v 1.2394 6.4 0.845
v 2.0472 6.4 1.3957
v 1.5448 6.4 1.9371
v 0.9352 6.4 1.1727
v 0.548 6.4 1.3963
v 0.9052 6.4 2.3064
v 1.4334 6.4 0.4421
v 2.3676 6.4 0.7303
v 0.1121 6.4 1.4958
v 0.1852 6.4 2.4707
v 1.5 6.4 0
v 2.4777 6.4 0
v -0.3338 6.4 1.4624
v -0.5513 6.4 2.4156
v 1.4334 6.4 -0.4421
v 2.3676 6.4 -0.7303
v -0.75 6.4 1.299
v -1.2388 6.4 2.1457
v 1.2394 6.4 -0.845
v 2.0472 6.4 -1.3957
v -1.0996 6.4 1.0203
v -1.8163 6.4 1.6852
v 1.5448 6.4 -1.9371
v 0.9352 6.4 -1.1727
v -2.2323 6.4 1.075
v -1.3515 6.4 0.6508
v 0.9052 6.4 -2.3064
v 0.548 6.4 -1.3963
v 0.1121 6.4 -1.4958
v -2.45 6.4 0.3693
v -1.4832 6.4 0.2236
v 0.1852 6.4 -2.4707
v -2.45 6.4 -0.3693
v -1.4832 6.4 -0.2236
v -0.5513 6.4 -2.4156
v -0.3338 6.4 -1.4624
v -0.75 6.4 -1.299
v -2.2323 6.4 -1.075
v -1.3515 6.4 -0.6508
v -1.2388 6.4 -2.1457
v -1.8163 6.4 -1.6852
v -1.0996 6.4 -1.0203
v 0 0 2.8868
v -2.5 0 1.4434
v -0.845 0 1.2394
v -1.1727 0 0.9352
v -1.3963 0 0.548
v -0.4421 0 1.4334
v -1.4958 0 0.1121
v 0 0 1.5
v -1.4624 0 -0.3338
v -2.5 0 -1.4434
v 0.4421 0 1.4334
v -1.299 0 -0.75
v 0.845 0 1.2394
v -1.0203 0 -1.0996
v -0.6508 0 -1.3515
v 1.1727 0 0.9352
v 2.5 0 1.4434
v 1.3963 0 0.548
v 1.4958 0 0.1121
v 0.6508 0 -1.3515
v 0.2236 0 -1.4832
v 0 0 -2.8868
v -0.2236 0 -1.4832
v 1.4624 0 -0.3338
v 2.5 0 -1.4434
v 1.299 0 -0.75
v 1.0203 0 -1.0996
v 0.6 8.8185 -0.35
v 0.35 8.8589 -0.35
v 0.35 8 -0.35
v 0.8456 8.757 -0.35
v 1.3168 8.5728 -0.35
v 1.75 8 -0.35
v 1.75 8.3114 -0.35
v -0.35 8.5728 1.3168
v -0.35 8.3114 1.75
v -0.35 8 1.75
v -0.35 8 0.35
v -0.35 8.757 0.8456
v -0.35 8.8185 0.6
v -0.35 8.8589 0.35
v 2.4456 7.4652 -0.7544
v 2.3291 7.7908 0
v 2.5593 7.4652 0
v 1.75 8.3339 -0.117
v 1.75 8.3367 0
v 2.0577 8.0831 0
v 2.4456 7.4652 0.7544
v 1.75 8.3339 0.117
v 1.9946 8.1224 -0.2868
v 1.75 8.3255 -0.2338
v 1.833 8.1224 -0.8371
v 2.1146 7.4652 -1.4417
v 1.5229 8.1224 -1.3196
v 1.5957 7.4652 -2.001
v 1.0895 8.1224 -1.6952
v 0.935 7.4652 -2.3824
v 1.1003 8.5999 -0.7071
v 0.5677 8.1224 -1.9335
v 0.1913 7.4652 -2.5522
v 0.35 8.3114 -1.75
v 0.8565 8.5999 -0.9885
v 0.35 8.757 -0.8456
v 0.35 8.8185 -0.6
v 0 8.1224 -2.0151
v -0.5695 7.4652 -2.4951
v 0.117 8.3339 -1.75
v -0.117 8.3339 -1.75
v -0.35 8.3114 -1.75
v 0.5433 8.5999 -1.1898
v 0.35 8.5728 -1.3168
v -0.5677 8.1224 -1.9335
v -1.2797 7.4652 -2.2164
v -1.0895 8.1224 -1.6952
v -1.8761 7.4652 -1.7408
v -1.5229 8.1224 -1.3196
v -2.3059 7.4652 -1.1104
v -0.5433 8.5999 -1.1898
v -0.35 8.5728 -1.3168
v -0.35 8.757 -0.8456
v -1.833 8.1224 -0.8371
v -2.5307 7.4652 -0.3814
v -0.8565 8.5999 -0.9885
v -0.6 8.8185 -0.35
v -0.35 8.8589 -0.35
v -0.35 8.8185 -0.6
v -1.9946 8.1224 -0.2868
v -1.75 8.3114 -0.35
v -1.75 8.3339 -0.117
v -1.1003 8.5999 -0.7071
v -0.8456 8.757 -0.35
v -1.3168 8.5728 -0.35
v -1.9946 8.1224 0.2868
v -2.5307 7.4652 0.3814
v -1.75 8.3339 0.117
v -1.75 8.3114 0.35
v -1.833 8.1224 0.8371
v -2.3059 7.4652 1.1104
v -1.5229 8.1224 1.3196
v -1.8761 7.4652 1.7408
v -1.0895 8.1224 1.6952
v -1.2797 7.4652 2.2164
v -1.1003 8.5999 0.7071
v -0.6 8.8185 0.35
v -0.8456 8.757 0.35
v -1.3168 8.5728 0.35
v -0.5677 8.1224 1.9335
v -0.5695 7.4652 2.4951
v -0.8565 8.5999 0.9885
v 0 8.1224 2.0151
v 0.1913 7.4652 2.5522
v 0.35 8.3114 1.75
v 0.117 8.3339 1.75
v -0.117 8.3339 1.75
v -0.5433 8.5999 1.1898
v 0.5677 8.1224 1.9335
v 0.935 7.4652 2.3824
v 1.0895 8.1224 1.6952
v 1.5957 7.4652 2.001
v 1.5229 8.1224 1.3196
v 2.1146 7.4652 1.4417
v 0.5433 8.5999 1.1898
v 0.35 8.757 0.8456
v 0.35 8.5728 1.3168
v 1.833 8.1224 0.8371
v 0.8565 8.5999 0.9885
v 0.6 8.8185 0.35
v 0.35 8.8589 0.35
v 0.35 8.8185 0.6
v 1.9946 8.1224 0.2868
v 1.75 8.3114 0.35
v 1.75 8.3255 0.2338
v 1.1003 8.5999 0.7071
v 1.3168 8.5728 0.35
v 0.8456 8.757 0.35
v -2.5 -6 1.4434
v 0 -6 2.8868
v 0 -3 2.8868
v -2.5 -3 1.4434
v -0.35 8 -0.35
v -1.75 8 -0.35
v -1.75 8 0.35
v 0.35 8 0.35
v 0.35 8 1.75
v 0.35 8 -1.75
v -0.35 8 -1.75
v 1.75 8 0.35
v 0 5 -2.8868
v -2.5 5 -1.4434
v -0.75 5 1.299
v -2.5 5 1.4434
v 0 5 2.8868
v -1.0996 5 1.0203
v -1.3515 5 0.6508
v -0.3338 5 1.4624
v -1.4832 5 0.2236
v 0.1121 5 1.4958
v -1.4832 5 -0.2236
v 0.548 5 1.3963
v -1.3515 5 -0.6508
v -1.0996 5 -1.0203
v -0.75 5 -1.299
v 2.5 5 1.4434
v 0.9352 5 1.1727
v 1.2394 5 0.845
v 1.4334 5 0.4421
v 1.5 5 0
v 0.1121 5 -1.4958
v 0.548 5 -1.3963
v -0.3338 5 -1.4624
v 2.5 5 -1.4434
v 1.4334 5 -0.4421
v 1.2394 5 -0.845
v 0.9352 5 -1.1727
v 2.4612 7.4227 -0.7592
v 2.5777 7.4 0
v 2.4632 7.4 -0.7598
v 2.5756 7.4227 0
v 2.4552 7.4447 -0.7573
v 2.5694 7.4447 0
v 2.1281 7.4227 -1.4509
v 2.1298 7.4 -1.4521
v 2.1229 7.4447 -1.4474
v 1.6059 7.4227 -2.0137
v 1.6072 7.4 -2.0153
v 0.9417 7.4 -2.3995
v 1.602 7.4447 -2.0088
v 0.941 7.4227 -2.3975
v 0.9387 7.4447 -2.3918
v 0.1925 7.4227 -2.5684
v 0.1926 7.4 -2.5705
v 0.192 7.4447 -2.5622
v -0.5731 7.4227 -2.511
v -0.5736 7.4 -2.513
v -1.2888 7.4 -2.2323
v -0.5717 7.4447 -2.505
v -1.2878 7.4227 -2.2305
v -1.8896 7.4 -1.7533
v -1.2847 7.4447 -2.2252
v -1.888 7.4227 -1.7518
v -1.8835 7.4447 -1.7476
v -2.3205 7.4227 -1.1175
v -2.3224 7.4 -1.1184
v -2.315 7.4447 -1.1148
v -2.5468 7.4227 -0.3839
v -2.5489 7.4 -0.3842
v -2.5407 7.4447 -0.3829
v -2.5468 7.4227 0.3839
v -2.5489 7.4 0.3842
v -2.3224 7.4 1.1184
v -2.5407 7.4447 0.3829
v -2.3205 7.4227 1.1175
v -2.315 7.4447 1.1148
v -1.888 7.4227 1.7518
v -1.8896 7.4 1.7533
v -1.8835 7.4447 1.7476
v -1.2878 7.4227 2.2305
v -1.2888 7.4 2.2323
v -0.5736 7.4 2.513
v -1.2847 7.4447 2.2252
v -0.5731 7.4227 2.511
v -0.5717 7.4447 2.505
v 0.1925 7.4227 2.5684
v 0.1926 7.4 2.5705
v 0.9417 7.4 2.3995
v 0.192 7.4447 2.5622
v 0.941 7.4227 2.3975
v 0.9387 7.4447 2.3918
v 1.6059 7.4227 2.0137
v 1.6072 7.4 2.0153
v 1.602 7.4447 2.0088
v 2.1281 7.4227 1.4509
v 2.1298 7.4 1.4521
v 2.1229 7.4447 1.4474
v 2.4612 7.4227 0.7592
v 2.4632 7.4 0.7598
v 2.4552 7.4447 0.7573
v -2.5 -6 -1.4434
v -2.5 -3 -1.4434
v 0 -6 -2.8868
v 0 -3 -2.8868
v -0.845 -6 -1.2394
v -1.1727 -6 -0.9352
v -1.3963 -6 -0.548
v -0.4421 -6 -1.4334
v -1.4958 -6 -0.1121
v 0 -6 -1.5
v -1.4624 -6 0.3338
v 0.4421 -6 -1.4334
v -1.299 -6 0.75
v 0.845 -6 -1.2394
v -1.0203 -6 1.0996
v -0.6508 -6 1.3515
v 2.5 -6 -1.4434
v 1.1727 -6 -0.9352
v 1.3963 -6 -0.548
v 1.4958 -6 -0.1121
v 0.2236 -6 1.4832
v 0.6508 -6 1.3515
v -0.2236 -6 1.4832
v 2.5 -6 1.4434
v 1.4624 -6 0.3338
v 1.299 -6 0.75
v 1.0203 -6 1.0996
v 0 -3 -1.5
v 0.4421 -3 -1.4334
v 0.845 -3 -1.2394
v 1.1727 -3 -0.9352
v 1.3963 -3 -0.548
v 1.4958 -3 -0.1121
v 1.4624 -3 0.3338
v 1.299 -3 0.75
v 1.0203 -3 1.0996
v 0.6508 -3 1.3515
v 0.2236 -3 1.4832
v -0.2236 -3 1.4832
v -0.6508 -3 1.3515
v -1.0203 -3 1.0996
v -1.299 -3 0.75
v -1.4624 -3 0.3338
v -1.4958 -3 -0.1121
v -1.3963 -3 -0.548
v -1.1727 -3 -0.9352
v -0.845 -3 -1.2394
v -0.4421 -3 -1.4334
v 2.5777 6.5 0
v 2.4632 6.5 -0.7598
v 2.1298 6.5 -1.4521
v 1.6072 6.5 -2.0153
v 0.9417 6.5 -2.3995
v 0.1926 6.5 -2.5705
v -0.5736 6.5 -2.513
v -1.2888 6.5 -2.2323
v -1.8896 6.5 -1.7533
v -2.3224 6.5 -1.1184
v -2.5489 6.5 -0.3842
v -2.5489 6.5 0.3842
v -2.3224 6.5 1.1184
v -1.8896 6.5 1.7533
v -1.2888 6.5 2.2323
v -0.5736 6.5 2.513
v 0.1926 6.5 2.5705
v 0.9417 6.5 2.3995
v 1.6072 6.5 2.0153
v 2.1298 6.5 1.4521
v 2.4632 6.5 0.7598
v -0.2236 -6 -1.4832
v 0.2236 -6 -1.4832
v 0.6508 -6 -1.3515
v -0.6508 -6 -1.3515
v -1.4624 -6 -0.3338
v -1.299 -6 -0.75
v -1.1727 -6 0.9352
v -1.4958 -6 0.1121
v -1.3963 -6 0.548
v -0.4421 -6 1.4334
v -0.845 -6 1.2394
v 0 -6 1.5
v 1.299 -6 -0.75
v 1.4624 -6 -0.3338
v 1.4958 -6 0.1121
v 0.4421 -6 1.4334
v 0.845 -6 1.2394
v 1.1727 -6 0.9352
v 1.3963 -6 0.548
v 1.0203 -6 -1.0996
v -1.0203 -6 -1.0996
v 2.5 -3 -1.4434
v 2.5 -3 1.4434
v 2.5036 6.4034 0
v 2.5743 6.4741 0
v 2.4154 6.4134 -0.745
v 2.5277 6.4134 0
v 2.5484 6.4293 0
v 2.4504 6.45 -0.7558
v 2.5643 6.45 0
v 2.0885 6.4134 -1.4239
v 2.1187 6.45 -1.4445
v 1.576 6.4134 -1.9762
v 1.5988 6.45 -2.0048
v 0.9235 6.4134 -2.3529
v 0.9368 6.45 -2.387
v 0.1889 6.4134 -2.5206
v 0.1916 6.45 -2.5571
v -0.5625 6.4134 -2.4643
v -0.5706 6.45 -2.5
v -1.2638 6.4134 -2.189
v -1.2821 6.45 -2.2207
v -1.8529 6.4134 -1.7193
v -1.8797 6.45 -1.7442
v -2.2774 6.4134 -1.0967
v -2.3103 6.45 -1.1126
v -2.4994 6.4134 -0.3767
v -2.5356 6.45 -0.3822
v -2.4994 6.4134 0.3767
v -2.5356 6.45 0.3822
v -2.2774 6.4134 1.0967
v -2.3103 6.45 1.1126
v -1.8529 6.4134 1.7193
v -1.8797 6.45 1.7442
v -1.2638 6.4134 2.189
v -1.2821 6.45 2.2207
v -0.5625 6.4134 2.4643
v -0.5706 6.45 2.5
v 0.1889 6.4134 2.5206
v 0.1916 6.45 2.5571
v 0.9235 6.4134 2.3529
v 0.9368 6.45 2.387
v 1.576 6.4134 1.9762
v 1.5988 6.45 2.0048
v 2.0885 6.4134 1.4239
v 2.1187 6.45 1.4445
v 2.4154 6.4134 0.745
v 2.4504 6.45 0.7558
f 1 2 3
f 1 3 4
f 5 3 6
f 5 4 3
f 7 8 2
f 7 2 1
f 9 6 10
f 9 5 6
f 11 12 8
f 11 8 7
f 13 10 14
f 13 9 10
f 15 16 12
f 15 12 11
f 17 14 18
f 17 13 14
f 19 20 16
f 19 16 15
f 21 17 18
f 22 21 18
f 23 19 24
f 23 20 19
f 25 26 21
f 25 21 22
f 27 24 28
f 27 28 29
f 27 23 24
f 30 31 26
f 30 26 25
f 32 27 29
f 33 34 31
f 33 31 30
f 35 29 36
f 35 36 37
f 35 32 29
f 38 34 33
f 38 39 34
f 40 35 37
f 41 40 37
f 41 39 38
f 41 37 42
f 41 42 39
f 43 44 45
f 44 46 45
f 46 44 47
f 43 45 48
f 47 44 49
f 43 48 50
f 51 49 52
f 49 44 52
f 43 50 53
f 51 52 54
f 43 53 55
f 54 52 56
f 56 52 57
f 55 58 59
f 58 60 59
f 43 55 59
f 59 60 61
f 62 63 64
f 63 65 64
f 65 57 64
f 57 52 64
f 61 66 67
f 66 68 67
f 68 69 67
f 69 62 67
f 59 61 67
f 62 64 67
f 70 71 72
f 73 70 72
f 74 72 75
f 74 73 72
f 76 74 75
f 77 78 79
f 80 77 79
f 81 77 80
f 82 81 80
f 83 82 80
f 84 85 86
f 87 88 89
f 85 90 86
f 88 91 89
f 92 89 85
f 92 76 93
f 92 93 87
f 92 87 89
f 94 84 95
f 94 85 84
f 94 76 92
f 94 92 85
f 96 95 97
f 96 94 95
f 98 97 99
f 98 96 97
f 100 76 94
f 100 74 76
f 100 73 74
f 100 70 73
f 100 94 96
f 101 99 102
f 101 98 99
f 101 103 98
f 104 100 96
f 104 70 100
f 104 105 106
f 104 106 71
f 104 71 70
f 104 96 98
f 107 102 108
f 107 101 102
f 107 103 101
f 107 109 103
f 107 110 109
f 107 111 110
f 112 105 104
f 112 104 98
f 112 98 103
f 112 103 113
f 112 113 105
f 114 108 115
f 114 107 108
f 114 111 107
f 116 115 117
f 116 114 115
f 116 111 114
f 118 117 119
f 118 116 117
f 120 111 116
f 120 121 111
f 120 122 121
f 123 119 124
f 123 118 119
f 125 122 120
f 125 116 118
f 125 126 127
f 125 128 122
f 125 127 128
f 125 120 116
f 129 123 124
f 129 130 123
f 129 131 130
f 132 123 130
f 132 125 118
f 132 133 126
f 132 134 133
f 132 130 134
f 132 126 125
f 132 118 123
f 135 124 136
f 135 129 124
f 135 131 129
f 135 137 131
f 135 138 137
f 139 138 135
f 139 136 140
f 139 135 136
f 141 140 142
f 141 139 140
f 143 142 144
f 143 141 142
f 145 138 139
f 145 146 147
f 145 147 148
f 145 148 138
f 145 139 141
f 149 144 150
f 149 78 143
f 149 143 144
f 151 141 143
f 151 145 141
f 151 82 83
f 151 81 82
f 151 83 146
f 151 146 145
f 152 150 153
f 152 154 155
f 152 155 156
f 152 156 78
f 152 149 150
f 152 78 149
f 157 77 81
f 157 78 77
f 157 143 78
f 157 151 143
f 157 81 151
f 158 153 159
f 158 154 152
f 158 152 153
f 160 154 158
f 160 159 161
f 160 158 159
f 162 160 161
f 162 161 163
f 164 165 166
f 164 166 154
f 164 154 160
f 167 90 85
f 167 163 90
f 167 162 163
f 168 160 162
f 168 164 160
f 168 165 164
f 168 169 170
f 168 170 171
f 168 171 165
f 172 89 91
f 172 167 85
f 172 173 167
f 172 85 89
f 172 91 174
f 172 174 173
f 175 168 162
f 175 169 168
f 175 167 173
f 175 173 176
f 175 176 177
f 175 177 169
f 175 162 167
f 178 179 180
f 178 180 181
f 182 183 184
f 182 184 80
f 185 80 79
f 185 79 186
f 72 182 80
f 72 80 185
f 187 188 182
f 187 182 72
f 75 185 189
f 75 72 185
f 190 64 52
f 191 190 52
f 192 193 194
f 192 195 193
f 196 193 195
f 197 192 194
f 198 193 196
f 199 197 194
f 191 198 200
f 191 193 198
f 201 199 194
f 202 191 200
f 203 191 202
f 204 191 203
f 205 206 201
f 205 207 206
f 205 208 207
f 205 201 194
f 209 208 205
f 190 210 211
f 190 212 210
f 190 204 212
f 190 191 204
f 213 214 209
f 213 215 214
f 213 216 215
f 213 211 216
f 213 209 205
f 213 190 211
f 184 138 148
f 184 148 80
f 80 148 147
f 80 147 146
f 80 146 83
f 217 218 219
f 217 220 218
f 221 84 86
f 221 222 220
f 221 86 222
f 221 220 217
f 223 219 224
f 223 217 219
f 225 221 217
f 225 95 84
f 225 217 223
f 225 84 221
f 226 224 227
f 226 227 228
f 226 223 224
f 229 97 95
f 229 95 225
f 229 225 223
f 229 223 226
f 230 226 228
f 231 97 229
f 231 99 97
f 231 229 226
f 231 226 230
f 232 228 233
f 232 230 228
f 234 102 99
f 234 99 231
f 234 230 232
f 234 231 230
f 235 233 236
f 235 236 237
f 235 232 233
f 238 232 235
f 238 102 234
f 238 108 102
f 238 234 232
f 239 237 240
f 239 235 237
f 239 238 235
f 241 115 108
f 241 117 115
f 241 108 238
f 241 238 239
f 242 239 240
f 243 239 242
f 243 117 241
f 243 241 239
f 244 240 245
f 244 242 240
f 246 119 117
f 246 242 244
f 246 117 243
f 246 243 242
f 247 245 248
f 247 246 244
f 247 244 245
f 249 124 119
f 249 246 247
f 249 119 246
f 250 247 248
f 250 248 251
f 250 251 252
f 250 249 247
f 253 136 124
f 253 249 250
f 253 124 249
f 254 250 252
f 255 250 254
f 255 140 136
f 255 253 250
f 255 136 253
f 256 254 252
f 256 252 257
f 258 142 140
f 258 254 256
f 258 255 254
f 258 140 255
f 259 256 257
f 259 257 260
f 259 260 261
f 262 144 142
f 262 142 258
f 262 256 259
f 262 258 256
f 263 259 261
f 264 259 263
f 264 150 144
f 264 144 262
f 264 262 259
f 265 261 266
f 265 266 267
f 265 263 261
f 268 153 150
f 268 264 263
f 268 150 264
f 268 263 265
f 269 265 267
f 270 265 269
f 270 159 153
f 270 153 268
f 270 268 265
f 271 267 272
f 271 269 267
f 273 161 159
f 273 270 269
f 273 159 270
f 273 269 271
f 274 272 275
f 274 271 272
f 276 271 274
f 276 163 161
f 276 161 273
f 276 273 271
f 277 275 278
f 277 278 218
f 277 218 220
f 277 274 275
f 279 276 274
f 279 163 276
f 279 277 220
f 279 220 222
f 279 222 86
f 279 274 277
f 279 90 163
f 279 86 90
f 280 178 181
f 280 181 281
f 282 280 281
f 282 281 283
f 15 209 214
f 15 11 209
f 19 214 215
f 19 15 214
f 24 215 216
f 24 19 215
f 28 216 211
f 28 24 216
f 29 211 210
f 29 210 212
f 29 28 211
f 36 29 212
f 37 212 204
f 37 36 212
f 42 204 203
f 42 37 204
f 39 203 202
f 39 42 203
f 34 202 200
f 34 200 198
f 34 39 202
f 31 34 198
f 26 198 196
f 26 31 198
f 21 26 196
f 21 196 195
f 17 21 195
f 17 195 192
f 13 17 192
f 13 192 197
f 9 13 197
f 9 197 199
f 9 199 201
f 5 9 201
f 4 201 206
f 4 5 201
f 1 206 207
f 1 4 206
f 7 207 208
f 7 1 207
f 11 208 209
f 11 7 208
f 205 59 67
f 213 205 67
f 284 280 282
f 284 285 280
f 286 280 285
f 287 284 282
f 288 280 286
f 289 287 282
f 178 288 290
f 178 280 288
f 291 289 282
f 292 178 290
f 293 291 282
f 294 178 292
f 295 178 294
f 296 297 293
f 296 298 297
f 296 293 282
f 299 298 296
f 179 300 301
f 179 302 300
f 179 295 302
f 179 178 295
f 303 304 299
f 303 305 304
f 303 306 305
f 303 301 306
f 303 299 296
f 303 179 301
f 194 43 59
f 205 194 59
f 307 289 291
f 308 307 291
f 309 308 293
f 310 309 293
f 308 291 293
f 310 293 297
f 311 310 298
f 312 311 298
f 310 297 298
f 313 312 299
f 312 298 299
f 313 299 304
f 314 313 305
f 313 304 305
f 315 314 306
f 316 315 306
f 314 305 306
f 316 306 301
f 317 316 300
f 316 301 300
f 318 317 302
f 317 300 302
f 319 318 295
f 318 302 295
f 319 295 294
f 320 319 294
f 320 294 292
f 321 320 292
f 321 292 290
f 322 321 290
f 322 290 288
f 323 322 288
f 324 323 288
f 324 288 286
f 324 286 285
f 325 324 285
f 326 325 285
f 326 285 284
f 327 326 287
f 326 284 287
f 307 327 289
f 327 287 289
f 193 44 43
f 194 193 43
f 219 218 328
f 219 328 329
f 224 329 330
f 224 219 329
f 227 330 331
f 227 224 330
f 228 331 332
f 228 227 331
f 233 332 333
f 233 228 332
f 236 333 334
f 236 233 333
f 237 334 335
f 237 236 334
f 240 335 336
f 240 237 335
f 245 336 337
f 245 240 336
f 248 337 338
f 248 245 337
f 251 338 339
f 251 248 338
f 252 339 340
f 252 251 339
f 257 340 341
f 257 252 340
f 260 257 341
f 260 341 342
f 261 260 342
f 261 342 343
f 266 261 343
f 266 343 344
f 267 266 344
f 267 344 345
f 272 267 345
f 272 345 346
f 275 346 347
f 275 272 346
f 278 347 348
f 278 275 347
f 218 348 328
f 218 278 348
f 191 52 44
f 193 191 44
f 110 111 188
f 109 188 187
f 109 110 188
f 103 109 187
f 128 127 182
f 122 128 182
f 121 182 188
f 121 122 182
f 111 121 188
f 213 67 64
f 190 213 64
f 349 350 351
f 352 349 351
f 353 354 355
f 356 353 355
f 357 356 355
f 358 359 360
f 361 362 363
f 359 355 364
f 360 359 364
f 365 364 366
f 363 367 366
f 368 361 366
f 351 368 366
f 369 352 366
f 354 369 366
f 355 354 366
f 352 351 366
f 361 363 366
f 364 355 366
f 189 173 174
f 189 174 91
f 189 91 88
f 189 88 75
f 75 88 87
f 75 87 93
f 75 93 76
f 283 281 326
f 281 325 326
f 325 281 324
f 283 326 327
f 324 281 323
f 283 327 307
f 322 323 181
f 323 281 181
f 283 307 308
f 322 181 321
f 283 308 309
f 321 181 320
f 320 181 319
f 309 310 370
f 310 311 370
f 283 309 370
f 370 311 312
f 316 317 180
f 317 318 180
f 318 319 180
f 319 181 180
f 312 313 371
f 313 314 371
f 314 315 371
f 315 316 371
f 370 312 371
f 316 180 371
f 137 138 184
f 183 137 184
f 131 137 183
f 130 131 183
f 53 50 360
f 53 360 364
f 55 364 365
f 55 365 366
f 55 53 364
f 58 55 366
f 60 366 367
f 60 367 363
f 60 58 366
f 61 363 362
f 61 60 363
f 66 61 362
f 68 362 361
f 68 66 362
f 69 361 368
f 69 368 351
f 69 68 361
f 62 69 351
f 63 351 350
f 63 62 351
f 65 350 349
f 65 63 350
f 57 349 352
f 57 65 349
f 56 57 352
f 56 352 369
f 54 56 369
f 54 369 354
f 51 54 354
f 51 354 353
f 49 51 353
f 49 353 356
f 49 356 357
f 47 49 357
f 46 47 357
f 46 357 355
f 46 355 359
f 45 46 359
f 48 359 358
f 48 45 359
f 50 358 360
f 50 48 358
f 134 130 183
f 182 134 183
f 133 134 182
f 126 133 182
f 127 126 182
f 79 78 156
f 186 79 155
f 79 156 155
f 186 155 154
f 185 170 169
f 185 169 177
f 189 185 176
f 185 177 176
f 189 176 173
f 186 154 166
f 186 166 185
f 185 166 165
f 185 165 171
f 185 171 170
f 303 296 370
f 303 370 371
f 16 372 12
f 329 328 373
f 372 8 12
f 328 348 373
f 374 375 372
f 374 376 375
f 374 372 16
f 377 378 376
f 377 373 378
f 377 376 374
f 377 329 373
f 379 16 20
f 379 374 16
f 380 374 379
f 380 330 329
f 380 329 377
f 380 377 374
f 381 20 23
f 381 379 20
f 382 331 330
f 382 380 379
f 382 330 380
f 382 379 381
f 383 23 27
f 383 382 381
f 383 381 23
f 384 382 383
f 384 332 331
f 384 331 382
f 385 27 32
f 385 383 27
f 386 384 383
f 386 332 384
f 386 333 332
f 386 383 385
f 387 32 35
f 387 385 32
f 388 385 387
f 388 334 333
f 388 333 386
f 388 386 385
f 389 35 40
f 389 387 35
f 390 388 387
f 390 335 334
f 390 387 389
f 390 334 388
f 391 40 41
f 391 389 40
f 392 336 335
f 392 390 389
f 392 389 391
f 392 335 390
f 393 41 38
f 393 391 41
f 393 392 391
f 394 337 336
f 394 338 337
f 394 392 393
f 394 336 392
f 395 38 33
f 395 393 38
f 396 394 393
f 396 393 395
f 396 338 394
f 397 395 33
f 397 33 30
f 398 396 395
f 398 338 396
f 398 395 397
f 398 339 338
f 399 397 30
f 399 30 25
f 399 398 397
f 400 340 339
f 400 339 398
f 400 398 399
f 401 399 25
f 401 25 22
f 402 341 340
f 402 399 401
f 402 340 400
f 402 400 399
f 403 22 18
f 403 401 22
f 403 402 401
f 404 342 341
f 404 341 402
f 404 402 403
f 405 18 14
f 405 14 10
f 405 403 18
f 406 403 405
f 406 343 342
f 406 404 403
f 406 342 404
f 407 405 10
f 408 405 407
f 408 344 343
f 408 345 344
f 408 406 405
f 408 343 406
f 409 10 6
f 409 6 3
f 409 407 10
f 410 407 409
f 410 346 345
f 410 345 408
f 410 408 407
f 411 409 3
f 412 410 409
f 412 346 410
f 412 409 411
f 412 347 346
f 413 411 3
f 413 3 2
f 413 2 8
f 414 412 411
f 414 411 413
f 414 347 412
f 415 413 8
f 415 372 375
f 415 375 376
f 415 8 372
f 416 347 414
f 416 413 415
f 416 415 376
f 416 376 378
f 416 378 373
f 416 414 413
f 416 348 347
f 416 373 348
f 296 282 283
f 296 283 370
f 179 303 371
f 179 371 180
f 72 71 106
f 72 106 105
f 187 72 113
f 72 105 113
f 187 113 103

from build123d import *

# Parameters (mm, degrees)
BOSS_EXTRUDE1_DEPTH = 5
SKETCH1_4_R         = 1.5
BOSS_EXTRUDE2_DEPTH = 6
CUT_EXTRUDE1_DEPTH  = 7
FILLET1_R           = 0.1
SKETCH5_R           = 1.5
BOSS_EXTRUDE3_DEPTH = 3


with BuildPart() as part:
    # Sketch1 → Boss-Extrude1 (new body)
    with BuildSketch(Plane(origin=(0, 0, 0), x_dir=(1, 0, 0), z_dir=(0, 1, 0))):
        Polygon((2.5, -1.443375673), (2.5, 1.443375673), (0, 2.886751346), (-2.5, 1.443375673), (-2.5, -1.443375673), (0, -2.886751346), align=None)
    extrude(amount=BOSS_EXTRUDE1_DEPTH)

    # Sketch1<4> → Boss-Extrude2 (add)
    with BuildSketch(Plane(origin=(0, 0, 0), x_dir=(1, 0, 0), z_dir=(0, 1, 0))):
        Circle(SKETCH1_4_R)
    extrude(amount=-BOSS_EXTRUDE2_DEPTH)

    # Sketch3 → Revolve1 (revolve)
    with BuildSketch(Plane.XY):
        with BuildLine():
            Line((0, 5), (1.5, 5))
            Line((1.5, 5), (1.5, 6.4))
            Line((1.5, 6.4), (2.577677109, 6.4))
            Line((2.577677109, 6.4), (2.577677109, 7.4))
            ThreePointArc((2.577677109, 7.4), (2.572999105, 7.433876498), (2.559315235, 7.465217406))
            ThreePointArc((2.559315235, 7.465217406), (1.467028933, 8.516835132), (0, 8.9))
            Line((0, 8.9), (0, 5))
        make_face()
    revolve(axis=Axis((0, 5, 0), (0, -1, 0)))

    # Sketch4 → Cut-Extrude1 (cut)
    with BuildSketch(Plane(origin=(0, 15, 0), x_dir=(1, 0, 0), z_dir=(0, 1, 0))):
        Polygon((-1.75, 0.35), (-1.75, -0.35), (-0.35, -0.35), (-0.35, -1.75), (0.35, -1.75), (0.35, -0.35), (1.75, -0.35), (1.75, 0.35), (0.35, 0.35), (0.35, 1.75), (-0.35, 1.75), (-0.35, 0.35), align=None)
    extrude(amount=-CUT_EXTRUDE1_DEPTH, mode=Mode.SUBTRACT)

    # Fillet1
    fillet1_edges = [part.edges().sort_by_distance(p)[0] for p in [
        (-2.577677109, 6.4, 0),
    ]]
    fillet(fillet1_edges, radius=FILLET1_R)


with BuildPart() as body_2:
    # Sketch5 → Boss-Extrude3 (new body)
    with BuildSketch(Plane.XZ.offset(6)):
        Polygon((2.5, 1.443375673), (0, 2.886751346), (-2.5, 1.443375673), (-2.5, -1.443375673), (0, -2.886751346), (2.5, -1.443375673), align=None)
        Circle(SKETCH5_R, mode=Mode.SUBTRACT)
    extrude(amount=-BOSS_EXTRUDE3_DEPTH)


solid = Compound([part.part, body_2.part])
